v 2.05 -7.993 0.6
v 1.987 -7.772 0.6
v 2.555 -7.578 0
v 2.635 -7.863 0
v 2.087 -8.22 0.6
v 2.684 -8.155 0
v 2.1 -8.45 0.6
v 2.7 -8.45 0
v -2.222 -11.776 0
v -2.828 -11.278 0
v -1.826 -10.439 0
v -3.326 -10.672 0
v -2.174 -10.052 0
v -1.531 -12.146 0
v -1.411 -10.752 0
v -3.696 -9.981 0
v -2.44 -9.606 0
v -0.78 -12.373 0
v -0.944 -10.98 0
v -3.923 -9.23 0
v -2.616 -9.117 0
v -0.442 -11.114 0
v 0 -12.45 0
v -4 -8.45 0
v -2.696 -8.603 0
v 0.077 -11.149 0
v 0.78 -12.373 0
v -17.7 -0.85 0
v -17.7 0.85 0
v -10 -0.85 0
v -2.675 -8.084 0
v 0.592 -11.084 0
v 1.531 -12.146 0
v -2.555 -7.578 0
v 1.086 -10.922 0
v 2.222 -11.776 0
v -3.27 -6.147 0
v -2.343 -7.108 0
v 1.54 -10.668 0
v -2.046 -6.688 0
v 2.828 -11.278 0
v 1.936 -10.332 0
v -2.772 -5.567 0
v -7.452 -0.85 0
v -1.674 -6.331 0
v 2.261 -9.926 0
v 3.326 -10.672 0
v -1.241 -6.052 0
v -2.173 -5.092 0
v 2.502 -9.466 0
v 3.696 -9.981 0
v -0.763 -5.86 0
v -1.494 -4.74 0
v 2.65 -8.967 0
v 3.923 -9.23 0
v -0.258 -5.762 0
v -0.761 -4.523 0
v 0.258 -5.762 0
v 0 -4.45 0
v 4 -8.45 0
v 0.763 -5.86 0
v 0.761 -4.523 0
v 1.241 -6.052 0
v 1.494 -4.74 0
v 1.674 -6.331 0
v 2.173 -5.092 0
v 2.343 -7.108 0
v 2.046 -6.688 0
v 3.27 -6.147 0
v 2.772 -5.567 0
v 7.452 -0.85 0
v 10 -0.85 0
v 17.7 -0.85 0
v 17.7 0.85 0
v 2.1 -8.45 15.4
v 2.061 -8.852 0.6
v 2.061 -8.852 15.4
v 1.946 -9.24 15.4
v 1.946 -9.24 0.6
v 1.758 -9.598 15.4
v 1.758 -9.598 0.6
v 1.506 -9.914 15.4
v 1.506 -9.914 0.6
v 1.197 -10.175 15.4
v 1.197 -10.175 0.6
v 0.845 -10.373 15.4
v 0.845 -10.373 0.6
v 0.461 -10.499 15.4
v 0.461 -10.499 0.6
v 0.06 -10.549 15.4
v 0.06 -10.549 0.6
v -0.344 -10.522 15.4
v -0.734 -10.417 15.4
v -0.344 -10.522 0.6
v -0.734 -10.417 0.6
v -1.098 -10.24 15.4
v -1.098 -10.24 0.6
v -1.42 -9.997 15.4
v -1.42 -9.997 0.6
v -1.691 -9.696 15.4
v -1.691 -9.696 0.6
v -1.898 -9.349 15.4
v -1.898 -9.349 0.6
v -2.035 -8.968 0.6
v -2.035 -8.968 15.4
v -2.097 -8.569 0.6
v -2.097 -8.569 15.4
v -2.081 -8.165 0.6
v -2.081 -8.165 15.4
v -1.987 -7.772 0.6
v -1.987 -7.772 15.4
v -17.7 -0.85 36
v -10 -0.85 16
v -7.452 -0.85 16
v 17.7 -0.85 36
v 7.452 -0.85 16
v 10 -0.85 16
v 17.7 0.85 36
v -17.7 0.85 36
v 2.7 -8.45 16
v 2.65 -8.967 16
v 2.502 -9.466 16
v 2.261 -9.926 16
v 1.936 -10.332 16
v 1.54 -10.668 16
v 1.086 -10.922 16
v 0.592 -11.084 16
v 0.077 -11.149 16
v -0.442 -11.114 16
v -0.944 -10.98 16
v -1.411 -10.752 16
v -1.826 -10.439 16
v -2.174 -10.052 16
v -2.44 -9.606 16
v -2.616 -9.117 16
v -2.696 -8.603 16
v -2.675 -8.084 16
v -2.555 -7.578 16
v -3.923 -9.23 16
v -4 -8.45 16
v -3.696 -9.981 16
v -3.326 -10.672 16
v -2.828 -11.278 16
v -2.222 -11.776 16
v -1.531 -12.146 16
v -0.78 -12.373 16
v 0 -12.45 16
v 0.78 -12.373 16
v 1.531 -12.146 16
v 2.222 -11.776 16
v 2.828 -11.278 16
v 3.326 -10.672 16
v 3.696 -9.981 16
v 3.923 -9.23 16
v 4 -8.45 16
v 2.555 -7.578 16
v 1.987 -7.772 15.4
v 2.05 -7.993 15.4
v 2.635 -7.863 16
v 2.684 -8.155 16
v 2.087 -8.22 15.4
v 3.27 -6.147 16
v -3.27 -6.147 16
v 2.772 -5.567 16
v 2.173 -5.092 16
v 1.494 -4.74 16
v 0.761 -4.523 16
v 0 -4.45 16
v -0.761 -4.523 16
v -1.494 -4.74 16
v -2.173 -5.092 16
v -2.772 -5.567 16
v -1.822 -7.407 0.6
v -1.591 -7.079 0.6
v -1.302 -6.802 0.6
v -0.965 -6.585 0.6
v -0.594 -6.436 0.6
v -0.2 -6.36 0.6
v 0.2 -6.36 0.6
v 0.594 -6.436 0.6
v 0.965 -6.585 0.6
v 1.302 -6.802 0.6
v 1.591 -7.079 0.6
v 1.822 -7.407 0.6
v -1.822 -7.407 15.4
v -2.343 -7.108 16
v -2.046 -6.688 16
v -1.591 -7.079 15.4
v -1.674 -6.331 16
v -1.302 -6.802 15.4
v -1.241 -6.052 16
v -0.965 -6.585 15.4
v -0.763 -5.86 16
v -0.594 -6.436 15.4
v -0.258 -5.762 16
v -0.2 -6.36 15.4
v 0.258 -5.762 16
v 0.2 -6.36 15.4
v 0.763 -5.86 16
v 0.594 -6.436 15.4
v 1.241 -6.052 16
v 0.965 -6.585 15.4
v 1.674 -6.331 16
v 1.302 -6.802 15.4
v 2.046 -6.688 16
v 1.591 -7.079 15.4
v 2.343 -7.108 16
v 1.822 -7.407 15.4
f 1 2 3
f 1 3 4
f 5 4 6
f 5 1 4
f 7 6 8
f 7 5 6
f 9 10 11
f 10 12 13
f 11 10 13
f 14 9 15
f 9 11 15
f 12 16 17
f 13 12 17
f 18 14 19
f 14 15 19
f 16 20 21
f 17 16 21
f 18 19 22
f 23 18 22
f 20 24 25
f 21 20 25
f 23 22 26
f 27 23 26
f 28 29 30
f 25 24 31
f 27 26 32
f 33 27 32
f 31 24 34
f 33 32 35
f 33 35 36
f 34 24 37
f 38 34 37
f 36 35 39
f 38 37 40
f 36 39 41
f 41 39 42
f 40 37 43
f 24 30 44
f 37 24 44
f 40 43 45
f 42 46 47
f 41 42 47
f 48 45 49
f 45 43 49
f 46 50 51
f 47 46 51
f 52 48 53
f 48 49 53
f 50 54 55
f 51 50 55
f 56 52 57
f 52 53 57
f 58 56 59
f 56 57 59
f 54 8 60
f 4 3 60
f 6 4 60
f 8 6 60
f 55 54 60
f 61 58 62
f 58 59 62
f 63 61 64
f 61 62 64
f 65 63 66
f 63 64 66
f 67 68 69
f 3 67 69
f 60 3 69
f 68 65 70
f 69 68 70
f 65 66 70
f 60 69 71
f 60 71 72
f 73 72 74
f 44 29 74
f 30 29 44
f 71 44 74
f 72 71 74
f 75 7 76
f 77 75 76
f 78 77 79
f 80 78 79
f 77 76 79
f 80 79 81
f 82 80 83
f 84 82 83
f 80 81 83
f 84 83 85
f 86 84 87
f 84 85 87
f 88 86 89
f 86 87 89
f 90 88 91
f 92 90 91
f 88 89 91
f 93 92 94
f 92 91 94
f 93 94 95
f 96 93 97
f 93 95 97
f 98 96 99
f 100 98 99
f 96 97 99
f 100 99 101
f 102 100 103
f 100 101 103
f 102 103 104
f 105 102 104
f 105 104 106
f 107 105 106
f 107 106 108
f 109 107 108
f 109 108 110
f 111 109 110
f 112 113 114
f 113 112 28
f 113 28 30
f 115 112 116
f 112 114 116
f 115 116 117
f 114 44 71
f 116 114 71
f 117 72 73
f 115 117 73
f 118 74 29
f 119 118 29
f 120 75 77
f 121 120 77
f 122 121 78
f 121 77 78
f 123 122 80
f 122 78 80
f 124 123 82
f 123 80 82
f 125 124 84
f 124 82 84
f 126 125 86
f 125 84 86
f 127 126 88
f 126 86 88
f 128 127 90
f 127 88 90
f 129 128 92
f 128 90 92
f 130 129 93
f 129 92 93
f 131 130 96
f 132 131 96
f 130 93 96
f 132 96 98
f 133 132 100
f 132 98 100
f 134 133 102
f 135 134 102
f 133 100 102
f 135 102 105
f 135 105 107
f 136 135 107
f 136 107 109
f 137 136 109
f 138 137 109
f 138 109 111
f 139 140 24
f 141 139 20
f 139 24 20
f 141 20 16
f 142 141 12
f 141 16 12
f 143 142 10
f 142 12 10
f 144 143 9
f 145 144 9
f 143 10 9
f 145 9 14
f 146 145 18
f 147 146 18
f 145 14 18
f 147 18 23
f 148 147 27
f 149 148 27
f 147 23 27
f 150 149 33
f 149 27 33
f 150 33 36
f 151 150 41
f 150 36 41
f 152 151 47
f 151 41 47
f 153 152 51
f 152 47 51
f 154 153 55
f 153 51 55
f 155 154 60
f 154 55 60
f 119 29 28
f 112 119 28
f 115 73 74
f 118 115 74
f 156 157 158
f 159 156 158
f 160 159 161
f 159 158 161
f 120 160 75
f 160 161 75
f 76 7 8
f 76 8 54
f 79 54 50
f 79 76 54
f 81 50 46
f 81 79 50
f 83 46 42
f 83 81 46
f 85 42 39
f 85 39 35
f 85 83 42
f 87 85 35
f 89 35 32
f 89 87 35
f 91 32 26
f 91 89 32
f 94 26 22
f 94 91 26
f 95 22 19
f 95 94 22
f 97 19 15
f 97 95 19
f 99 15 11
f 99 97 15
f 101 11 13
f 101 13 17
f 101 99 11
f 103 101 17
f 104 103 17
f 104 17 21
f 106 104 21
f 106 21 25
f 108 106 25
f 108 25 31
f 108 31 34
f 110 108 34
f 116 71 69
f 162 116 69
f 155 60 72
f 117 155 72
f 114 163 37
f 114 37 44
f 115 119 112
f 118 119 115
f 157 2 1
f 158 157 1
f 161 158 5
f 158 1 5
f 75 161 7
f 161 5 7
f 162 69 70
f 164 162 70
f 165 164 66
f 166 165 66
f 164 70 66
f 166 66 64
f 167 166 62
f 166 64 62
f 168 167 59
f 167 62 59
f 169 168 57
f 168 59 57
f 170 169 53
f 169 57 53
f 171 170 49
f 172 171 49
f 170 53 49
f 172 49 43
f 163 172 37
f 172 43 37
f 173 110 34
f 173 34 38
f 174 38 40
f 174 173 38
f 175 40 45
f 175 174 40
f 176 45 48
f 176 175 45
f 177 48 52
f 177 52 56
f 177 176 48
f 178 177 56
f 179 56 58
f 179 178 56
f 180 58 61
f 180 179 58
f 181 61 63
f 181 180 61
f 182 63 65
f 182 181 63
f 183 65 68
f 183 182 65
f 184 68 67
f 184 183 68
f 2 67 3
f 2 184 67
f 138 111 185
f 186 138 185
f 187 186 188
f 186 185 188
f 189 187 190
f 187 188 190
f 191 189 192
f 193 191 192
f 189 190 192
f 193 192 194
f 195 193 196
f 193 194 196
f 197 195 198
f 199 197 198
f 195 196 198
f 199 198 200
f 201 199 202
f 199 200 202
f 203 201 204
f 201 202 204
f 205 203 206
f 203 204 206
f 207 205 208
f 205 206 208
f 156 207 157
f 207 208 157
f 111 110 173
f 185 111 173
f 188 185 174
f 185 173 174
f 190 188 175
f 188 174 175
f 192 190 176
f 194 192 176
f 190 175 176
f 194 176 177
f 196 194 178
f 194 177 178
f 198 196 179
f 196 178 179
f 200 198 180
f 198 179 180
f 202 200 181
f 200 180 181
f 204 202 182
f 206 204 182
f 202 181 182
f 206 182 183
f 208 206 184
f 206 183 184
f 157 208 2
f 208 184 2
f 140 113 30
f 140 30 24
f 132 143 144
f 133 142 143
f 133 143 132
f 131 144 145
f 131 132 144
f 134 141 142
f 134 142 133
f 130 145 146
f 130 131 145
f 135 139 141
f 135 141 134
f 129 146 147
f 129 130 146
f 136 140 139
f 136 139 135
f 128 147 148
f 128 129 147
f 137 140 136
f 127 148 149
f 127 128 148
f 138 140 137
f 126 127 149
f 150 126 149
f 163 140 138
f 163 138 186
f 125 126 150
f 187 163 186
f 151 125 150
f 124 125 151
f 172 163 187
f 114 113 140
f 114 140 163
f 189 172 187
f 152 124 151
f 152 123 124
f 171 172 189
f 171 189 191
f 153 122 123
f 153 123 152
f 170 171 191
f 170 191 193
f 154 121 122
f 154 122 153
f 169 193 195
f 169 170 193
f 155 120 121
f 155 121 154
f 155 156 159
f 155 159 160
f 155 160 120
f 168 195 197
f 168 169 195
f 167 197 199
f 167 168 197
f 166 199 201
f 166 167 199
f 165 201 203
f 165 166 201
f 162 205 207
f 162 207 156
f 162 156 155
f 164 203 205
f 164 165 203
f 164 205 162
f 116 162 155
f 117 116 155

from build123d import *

# Parameters (mm, degrees)
F1_DEPTH = 36
F2_DEPTH = 16
F3_SIZE  = 0.6


with BuildPart() as f1:
    # F0 (on Top) → F1 (new body)
    with BuildSketch(Plane.XY):
        Polygon((-7.451849, -0.85), (7.451849, -0.85), (10, -0.85), (17.7, -0.85), (17.7, 0.85), (-17.7, 0.85), (-17.7, -0.85), (-10, -0.85), align=None)
    extrude(amount=F1_DEPTH)

    # F0 (on Top) → F2 (join)
    with BuildSketch(Plane.XY):
        with BuildLine():
            ThreePointArc((-4, -8.45), (-3.813206, -7.241918), (-3.270269, -6.146668))
            Line((-3.270269, -6.146668), (-7.451849, -0.85))
            Line((-7.451849, -0.85), (-10, -0.85))
            Line((-10, -0.85), (-4, -8.45))
        make_face()
        with BuildLine():
            Line((7.451849, -0.85), (3.270269, -6.146668))
            ThreePointArc((3.270269, -6.146668), (3.813206, -7.241918), (4, -8.45))
            Line((4, -8.45), (10, -0.85))
            Line((10, -0.85), (7.451849, -0.85))
        make_face()
        with BuildLine():
            ThreePointArc((-1.987411, -7.771621), (0, -6.35), (1.987411, -7.771621))
            Line((1.987411, -7.771621), (3.270269, -6.146668))
            ThreePointArc((3.270269, -6.146668), (0, -4.45), (-3.270269, -6.146668))
            Line((-3.270269, -6.146668), (-1.987411, -7.771621))
        make_face()
        with BuildLine():
            ThreePointArc((1.987411, -7.771621), (2.071662, -8.106171), (2.1, -8.45))
            ThreePointArc((2.1, -8.45), (-0.343829, -10.521662), (-1.987411, -7.771621))
            Line((-1.987411, -7.771621), (-3.270269, -6.146668))
            ThreePointArc((-3.270269, -6.146668), (-3.813206, -7.241918), (-4, -8.45))
            ThreePointArc((-4, -8.45), (0, -12.45), (4, -8.45))
            ThreePointArc((4, -8.45), (3.813206, -7.241918), (3.270269, -6.146668))
            Line((3.270269, -6.146668), (1.987411, -7.771621))
        make_face()
    extrude(amount=F2_DEPTH)

    # F3
    f3_edges = [f1.edges().sort_by_distance(p)[0] for p in [
        (1.987411, -9.128379, 0),
        (1.987411, -9.128379, 16),
    ]]
    chamfer(f3_edges, length=F3_SIZE)


solid = f1.part
